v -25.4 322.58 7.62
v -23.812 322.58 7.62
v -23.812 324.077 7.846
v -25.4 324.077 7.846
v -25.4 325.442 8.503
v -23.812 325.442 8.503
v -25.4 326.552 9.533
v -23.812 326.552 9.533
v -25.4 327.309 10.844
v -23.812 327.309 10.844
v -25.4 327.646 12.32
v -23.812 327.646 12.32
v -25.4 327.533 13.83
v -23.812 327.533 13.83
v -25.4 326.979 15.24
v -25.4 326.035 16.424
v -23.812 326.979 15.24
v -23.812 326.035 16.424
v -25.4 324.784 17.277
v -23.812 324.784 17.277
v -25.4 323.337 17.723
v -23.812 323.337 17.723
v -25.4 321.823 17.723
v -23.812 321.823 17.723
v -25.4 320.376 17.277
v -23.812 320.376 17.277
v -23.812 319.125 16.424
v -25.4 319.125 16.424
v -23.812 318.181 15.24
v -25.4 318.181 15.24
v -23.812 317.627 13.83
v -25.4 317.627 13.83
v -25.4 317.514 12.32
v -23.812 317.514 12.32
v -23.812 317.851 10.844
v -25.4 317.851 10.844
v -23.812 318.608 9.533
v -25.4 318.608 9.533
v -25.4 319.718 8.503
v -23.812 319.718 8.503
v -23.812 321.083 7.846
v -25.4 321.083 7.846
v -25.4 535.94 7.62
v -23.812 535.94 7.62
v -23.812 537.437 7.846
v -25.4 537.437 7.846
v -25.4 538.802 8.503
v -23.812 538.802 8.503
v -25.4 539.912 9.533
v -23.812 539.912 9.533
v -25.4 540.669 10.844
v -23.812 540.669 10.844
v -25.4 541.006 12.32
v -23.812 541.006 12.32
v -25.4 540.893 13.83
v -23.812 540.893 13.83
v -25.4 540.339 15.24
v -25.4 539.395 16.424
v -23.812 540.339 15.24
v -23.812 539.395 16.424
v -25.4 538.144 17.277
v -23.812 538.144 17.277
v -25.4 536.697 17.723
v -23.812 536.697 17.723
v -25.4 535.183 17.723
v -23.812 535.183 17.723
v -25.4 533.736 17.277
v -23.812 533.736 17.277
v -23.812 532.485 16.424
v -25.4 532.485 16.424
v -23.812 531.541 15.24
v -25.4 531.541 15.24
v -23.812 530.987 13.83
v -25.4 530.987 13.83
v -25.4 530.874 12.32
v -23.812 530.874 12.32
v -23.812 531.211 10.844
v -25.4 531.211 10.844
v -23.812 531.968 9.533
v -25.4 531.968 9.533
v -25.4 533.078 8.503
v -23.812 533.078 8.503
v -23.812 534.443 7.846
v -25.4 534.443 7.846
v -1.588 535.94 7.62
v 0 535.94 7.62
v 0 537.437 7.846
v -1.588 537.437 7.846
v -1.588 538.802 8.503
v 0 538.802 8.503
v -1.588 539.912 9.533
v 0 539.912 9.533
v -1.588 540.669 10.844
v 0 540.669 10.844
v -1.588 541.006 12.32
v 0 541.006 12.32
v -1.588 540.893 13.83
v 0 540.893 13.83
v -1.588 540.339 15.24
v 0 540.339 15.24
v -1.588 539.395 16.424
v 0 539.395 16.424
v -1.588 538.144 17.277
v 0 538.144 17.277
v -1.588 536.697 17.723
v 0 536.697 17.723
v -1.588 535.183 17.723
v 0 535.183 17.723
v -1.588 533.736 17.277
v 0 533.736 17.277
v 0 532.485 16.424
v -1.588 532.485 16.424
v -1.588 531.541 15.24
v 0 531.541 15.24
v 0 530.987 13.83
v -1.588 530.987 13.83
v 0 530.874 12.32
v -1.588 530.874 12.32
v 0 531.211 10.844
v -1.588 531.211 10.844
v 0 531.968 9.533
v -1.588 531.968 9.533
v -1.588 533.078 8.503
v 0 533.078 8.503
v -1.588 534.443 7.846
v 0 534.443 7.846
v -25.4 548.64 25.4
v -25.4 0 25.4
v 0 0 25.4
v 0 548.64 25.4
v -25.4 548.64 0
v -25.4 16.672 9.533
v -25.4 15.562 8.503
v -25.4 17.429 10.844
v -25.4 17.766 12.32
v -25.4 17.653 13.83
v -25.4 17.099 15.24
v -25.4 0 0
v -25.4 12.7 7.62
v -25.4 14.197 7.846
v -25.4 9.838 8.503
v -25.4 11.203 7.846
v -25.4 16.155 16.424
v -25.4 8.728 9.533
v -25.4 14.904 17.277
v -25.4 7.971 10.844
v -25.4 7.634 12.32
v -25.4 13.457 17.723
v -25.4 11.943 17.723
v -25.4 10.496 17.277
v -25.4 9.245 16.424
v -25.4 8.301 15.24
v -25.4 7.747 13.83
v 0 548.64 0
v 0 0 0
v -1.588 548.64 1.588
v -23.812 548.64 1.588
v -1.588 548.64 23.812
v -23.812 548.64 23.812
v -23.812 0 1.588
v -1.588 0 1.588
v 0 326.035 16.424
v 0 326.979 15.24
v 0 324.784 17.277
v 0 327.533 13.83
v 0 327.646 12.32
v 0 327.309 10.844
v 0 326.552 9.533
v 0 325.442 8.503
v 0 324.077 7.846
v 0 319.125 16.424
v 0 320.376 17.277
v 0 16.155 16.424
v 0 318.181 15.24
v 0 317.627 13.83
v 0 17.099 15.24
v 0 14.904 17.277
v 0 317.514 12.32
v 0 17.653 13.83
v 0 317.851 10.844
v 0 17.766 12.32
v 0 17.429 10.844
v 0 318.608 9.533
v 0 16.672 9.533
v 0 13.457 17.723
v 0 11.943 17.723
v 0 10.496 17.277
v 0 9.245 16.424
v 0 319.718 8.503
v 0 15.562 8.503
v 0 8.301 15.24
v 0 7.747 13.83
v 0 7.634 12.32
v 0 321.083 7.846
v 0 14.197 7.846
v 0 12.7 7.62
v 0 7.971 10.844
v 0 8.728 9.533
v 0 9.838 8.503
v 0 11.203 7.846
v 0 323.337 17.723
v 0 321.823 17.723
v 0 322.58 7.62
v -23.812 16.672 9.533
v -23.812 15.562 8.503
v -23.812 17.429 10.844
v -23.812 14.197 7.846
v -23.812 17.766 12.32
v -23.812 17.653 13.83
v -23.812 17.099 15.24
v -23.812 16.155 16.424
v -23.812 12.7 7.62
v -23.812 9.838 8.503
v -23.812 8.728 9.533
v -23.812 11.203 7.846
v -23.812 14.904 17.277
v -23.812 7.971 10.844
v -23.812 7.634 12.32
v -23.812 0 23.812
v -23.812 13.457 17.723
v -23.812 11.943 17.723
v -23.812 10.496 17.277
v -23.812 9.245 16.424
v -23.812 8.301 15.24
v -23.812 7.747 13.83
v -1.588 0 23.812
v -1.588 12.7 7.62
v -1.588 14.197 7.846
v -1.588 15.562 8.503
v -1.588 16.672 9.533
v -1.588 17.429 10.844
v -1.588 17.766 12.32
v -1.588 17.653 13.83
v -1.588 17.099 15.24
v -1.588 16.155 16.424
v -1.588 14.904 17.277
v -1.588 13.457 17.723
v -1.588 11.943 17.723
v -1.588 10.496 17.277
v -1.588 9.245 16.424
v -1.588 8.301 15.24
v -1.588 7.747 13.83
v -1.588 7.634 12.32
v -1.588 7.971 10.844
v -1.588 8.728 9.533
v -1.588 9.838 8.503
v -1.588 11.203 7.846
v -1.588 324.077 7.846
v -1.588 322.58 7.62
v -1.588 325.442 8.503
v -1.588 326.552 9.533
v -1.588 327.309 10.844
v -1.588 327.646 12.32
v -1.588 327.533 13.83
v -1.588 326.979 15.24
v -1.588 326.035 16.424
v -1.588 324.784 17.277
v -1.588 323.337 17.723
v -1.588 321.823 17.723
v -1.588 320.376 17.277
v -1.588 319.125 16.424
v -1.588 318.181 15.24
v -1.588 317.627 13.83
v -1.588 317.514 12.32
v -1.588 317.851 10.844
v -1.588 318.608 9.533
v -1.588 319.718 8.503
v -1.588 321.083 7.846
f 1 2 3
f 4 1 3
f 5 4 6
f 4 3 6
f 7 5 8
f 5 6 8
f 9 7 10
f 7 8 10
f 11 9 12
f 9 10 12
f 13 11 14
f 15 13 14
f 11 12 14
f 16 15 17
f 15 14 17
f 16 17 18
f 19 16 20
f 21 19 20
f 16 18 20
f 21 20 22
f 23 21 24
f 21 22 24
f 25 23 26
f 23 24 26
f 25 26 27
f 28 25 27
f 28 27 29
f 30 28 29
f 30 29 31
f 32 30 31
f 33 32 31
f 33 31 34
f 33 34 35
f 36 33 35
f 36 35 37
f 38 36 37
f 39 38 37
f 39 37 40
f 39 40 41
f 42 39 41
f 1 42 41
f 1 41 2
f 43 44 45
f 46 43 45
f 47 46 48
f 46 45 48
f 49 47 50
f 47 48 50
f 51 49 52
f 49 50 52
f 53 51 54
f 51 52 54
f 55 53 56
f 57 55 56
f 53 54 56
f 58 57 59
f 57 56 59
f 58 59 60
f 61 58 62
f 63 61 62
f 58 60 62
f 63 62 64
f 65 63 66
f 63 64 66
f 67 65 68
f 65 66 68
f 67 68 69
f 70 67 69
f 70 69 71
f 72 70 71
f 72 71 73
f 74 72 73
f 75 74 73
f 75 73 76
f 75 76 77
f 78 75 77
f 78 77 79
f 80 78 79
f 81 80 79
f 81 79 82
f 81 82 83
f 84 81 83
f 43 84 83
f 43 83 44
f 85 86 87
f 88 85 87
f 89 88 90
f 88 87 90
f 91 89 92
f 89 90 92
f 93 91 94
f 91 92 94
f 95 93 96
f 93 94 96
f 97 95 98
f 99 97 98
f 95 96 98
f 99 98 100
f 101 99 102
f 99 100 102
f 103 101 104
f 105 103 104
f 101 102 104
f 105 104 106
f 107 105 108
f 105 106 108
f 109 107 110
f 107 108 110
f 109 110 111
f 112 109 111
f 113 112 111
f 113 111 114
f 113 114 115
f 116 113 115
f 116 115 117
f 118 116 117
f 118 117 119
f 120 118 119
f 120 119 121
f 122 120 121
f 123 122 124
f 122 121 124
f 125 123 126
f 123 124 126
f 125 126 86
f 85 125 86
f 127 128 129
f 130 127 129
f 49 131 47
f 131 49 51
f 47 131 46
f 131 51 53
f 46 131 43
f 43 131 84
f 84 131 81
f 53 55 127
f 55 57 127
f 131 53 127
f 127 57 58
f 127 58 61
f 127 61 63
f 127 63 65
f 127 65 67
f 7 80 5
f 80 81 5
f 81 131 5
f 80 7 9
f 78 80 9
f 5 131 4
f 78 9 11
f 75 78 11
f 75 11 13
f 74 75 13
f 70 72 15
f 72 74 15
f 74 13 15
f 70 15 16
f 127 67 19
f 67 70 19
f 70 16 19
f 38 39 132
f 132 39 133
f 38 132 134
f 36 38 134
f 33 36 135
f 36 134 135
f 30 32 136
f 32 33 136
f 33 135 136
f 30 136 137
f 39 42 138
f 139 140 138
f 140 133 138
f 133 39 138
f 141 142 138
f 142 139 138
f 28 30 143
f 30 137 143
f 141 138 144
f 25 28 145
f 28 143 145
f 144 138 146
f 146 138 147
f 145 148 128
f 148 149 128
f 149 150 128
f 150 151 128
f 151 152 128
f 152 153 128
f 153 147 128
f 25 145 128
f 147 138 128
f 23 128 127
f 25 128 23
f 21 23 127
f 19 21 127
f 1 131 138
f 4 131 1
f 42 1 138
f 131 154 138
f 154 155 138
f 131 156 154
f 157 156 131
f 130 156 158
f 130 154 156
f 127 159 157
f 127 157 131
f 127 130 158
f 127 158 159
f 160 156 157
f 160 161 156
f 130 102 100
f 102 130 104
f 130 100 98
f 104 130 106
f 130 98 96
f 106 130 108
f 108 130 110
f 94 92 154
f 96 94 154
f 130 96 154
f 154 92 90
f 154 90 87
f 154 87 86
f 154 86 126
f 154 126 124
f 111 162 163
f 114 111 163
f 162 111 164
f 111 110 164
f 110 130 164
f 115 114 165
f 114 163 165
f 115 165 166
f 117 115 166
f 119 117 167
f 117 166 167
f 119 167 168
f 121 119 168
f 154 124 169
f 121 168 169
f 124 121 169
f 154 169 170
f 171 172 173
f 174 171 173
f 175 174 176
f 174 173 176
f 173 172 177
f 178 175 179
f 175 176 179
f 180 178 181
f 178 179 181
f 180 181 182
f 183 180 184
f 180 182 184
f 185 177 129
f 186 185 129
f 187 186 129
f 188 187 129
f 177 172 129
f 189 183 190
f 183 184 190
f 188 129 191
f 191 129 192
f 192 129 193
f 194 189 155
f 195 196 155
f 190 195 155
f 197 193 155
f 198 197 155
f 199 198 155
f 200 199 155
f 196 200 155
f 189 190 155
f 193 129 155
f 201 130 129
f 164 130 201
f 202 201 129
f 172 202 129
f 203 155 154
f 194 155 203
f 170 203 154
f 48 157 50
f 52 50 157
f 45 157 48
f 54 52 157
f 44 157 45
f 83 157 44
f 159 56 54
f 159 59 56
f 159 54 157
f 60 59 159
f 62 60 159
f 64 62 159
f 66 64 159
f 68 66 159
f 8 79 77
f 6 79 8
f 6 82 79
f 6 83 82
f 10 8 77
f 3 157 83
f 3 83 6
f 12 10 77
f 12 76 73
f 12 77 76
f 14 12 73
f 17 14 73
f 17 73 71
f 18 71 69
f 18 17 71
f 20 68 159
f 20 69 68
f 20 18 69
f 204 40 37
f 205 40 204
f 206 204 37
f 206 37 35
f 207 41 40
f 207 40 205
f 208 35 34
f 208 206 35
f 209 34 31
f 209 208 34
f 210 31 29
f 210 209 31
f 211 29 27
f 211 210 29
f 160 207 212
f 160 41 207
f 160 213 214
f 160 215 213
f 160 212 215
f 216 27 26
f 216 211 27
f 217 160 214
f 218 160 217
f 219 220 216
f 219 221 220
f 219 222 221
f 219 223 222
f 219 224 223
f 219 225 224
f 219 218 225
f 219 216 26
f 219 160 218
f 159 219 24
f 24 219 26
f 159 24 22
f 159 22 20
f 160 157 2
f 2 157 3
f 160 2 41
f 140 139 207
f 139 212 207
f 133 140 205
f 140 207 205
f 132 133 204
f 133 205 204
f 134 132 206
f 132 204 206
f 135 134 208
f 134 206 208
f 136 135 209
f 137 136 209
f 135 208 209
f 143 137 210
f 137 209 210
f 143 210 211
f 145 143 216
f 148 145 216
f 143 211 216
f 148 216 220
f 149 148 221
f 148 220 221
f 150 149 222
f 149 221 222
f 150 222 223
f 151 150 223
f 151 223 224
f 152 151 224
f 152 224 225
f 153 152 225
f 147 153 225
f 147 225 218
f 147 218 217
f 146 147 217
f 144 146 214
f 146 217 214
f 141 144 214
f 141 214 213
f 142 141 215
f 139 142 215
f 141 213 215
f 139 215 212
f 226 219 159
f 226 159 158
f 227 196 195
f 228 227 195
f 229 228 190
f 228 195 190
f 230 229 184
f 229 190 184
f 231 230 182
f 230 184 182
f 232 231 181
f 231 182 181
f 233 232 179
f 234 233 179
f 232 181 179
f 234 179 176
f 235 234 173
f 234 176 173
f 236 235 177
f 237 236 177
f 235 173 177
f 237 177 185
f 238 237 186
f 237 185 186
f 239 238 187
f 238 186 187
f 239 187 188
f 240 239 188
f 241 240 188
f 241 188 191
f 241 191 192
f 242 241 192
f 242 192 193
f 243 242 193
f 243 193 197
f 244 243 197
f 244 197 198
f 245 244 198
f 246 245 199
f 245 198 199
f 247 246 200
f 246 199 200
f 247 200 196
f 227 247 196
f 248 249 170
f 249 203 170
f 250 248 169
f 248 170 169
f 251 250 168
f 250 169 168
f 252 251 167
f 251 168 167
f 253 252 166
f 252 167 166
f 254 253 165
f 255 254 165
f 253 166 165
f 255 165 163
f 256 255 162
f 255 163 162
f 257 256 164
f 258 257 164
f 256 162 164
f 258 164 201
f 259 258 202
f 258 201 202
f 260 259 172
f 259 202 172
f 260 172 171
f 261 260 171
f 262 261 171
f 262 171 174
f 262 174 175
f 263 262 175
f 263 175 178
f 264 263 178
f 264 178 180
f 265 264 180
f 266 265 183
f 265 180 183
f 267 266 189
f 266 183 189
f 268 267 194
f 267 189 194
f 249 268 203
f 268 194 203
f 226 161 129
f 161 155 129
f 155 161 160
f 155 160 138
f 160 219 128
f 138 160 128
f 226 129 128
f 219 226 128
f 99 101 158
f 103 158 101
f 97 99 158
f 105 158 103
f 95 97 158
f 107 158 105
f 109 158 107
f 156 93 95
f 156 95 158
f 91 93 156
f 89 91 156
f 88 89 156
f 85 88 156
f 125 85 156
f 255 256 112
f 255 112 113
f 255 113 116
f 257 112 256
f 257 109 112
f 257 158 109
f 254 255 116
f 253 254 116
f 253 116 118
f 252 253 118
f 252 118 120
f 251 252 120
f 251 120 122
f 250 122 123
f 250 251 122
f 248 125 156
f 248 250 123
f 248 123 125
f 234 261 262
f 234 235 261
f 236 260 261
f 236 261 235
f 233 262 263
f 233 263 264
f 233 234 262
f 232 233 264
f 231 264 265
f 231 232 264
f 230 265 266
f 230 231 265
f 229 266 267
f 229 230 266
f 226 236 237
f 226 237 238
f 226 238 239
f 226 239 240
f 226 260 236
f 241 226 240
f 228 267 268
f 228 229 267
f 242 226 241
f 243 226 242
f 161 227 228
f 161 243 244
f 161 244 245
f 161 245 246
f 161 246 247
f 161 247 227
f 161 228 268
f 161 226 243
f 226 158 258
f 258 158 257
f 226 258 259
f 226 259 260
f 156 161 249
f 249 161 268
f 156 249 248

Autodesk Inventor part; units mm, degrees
ref_plane "YZ Plane" through (0, 0, 0) normal (1, 0, 0) x (0, 1, 0)
ref_plane "XZ Plane" through (0, 0, 0) normal (0, 1, 0) x (-1, 0, 0)
ref_plane "XY Plane" through (0, 0, 0) normal (0, 0, 1) x (1, 0, 0)
sketch "Sketch1" plane through (0, 0, 0) normal (0, 1, 0) x (-1, 0, 0)
  line L0 (0, 0) -> (25.4, 0)
  line L1 (25.4, 0) -> (25.4, 25.4)
  line L2 (25.4, 25.4) -> (0, 25.4)
  line L3 (0, 25.4) -> (0, 0)
  line L4 (23.8125, 23.8125) -> (1.5875, 23.8125)
  line L5 (1.5875, 23.8125) -> (1.5875, 1.5875)
  line L6 (1.5875, 1.5875) -> (23.8125, 1.5875)
  line L7 (23.8125, 1.5875) -> (23.8125, 23.8125)
  dimension "d0" = 25.4
  dimension "d1" = 25.4
  dimension "d2" = 1.5875
  dimension "d3" = 1.5875
  dimension "d4" = 1.5875
  dimension "d5" = 1.5875
extrude "Extrusion1" add sketch "Sketch1" along normal blind 548.64
sketch "Sketch2" plane through (0, 0, 25.4) normal (1, 0, 0) x (0, 0, -1)
  circle A0 centre (12.7, 12.7) radius 5.08
  line L0 (25.4, 0) -> (25.4, 548.64) projected
  line L1 (0, 0) -> (25.4, 0) projected
  dimension "d9" = 12.7
  dimension "d10" = 10.16
  dimension "d11" = 12.7
extrude "Extrusion2" cut sketch "Sketch2" against normal blind 25.4
sketch "Sketch3" plane through (0, 0, 25.4) normal (1, 0, 0) x (0, 0, -1)
  circle A0 centre (12.7, 535.94) radius 5.08
  line L0 (25.4, 0) -> (25.4, 548.64) projected
  line L1 (0, 548.64) -> (25.4, 548.64) projected
  dimension "d14" = 12.7
  dimension "d15" = 12.7
  dimension "d16" = 10.16
extrude "Extrusion3" cut sketch "Sketch3" against normal blind 25.4
sketch "Sketch4" plane through (0, 0, 25.4) normal (1, 0, 0) x (0, 0, -1)
  point P0 (25.4, 0)
sketch "Sketch5" plane through (0, 0, 25.4) normal (1, 0, 0) x (0, 0, -1)
  circle A0 centre (12.7, 322.58) radius 5.08
  line L0 (0, 0) -> (0, 548.64) projected
  circle A1 centre (12.7, 535.94) radius 5.08 projected
  point P0 (25.4, 0)
  dimension "d19" = 10.16
  dimension "d20" = 12.7
  dimension "d21" = 213.36
extrude "Extrusion4" cut sketch "Sketch5" against normal blind 25.4 contours A0
properties part number "1x1 16th Inch Aluminum Tube - Custom for Lift Arms"
